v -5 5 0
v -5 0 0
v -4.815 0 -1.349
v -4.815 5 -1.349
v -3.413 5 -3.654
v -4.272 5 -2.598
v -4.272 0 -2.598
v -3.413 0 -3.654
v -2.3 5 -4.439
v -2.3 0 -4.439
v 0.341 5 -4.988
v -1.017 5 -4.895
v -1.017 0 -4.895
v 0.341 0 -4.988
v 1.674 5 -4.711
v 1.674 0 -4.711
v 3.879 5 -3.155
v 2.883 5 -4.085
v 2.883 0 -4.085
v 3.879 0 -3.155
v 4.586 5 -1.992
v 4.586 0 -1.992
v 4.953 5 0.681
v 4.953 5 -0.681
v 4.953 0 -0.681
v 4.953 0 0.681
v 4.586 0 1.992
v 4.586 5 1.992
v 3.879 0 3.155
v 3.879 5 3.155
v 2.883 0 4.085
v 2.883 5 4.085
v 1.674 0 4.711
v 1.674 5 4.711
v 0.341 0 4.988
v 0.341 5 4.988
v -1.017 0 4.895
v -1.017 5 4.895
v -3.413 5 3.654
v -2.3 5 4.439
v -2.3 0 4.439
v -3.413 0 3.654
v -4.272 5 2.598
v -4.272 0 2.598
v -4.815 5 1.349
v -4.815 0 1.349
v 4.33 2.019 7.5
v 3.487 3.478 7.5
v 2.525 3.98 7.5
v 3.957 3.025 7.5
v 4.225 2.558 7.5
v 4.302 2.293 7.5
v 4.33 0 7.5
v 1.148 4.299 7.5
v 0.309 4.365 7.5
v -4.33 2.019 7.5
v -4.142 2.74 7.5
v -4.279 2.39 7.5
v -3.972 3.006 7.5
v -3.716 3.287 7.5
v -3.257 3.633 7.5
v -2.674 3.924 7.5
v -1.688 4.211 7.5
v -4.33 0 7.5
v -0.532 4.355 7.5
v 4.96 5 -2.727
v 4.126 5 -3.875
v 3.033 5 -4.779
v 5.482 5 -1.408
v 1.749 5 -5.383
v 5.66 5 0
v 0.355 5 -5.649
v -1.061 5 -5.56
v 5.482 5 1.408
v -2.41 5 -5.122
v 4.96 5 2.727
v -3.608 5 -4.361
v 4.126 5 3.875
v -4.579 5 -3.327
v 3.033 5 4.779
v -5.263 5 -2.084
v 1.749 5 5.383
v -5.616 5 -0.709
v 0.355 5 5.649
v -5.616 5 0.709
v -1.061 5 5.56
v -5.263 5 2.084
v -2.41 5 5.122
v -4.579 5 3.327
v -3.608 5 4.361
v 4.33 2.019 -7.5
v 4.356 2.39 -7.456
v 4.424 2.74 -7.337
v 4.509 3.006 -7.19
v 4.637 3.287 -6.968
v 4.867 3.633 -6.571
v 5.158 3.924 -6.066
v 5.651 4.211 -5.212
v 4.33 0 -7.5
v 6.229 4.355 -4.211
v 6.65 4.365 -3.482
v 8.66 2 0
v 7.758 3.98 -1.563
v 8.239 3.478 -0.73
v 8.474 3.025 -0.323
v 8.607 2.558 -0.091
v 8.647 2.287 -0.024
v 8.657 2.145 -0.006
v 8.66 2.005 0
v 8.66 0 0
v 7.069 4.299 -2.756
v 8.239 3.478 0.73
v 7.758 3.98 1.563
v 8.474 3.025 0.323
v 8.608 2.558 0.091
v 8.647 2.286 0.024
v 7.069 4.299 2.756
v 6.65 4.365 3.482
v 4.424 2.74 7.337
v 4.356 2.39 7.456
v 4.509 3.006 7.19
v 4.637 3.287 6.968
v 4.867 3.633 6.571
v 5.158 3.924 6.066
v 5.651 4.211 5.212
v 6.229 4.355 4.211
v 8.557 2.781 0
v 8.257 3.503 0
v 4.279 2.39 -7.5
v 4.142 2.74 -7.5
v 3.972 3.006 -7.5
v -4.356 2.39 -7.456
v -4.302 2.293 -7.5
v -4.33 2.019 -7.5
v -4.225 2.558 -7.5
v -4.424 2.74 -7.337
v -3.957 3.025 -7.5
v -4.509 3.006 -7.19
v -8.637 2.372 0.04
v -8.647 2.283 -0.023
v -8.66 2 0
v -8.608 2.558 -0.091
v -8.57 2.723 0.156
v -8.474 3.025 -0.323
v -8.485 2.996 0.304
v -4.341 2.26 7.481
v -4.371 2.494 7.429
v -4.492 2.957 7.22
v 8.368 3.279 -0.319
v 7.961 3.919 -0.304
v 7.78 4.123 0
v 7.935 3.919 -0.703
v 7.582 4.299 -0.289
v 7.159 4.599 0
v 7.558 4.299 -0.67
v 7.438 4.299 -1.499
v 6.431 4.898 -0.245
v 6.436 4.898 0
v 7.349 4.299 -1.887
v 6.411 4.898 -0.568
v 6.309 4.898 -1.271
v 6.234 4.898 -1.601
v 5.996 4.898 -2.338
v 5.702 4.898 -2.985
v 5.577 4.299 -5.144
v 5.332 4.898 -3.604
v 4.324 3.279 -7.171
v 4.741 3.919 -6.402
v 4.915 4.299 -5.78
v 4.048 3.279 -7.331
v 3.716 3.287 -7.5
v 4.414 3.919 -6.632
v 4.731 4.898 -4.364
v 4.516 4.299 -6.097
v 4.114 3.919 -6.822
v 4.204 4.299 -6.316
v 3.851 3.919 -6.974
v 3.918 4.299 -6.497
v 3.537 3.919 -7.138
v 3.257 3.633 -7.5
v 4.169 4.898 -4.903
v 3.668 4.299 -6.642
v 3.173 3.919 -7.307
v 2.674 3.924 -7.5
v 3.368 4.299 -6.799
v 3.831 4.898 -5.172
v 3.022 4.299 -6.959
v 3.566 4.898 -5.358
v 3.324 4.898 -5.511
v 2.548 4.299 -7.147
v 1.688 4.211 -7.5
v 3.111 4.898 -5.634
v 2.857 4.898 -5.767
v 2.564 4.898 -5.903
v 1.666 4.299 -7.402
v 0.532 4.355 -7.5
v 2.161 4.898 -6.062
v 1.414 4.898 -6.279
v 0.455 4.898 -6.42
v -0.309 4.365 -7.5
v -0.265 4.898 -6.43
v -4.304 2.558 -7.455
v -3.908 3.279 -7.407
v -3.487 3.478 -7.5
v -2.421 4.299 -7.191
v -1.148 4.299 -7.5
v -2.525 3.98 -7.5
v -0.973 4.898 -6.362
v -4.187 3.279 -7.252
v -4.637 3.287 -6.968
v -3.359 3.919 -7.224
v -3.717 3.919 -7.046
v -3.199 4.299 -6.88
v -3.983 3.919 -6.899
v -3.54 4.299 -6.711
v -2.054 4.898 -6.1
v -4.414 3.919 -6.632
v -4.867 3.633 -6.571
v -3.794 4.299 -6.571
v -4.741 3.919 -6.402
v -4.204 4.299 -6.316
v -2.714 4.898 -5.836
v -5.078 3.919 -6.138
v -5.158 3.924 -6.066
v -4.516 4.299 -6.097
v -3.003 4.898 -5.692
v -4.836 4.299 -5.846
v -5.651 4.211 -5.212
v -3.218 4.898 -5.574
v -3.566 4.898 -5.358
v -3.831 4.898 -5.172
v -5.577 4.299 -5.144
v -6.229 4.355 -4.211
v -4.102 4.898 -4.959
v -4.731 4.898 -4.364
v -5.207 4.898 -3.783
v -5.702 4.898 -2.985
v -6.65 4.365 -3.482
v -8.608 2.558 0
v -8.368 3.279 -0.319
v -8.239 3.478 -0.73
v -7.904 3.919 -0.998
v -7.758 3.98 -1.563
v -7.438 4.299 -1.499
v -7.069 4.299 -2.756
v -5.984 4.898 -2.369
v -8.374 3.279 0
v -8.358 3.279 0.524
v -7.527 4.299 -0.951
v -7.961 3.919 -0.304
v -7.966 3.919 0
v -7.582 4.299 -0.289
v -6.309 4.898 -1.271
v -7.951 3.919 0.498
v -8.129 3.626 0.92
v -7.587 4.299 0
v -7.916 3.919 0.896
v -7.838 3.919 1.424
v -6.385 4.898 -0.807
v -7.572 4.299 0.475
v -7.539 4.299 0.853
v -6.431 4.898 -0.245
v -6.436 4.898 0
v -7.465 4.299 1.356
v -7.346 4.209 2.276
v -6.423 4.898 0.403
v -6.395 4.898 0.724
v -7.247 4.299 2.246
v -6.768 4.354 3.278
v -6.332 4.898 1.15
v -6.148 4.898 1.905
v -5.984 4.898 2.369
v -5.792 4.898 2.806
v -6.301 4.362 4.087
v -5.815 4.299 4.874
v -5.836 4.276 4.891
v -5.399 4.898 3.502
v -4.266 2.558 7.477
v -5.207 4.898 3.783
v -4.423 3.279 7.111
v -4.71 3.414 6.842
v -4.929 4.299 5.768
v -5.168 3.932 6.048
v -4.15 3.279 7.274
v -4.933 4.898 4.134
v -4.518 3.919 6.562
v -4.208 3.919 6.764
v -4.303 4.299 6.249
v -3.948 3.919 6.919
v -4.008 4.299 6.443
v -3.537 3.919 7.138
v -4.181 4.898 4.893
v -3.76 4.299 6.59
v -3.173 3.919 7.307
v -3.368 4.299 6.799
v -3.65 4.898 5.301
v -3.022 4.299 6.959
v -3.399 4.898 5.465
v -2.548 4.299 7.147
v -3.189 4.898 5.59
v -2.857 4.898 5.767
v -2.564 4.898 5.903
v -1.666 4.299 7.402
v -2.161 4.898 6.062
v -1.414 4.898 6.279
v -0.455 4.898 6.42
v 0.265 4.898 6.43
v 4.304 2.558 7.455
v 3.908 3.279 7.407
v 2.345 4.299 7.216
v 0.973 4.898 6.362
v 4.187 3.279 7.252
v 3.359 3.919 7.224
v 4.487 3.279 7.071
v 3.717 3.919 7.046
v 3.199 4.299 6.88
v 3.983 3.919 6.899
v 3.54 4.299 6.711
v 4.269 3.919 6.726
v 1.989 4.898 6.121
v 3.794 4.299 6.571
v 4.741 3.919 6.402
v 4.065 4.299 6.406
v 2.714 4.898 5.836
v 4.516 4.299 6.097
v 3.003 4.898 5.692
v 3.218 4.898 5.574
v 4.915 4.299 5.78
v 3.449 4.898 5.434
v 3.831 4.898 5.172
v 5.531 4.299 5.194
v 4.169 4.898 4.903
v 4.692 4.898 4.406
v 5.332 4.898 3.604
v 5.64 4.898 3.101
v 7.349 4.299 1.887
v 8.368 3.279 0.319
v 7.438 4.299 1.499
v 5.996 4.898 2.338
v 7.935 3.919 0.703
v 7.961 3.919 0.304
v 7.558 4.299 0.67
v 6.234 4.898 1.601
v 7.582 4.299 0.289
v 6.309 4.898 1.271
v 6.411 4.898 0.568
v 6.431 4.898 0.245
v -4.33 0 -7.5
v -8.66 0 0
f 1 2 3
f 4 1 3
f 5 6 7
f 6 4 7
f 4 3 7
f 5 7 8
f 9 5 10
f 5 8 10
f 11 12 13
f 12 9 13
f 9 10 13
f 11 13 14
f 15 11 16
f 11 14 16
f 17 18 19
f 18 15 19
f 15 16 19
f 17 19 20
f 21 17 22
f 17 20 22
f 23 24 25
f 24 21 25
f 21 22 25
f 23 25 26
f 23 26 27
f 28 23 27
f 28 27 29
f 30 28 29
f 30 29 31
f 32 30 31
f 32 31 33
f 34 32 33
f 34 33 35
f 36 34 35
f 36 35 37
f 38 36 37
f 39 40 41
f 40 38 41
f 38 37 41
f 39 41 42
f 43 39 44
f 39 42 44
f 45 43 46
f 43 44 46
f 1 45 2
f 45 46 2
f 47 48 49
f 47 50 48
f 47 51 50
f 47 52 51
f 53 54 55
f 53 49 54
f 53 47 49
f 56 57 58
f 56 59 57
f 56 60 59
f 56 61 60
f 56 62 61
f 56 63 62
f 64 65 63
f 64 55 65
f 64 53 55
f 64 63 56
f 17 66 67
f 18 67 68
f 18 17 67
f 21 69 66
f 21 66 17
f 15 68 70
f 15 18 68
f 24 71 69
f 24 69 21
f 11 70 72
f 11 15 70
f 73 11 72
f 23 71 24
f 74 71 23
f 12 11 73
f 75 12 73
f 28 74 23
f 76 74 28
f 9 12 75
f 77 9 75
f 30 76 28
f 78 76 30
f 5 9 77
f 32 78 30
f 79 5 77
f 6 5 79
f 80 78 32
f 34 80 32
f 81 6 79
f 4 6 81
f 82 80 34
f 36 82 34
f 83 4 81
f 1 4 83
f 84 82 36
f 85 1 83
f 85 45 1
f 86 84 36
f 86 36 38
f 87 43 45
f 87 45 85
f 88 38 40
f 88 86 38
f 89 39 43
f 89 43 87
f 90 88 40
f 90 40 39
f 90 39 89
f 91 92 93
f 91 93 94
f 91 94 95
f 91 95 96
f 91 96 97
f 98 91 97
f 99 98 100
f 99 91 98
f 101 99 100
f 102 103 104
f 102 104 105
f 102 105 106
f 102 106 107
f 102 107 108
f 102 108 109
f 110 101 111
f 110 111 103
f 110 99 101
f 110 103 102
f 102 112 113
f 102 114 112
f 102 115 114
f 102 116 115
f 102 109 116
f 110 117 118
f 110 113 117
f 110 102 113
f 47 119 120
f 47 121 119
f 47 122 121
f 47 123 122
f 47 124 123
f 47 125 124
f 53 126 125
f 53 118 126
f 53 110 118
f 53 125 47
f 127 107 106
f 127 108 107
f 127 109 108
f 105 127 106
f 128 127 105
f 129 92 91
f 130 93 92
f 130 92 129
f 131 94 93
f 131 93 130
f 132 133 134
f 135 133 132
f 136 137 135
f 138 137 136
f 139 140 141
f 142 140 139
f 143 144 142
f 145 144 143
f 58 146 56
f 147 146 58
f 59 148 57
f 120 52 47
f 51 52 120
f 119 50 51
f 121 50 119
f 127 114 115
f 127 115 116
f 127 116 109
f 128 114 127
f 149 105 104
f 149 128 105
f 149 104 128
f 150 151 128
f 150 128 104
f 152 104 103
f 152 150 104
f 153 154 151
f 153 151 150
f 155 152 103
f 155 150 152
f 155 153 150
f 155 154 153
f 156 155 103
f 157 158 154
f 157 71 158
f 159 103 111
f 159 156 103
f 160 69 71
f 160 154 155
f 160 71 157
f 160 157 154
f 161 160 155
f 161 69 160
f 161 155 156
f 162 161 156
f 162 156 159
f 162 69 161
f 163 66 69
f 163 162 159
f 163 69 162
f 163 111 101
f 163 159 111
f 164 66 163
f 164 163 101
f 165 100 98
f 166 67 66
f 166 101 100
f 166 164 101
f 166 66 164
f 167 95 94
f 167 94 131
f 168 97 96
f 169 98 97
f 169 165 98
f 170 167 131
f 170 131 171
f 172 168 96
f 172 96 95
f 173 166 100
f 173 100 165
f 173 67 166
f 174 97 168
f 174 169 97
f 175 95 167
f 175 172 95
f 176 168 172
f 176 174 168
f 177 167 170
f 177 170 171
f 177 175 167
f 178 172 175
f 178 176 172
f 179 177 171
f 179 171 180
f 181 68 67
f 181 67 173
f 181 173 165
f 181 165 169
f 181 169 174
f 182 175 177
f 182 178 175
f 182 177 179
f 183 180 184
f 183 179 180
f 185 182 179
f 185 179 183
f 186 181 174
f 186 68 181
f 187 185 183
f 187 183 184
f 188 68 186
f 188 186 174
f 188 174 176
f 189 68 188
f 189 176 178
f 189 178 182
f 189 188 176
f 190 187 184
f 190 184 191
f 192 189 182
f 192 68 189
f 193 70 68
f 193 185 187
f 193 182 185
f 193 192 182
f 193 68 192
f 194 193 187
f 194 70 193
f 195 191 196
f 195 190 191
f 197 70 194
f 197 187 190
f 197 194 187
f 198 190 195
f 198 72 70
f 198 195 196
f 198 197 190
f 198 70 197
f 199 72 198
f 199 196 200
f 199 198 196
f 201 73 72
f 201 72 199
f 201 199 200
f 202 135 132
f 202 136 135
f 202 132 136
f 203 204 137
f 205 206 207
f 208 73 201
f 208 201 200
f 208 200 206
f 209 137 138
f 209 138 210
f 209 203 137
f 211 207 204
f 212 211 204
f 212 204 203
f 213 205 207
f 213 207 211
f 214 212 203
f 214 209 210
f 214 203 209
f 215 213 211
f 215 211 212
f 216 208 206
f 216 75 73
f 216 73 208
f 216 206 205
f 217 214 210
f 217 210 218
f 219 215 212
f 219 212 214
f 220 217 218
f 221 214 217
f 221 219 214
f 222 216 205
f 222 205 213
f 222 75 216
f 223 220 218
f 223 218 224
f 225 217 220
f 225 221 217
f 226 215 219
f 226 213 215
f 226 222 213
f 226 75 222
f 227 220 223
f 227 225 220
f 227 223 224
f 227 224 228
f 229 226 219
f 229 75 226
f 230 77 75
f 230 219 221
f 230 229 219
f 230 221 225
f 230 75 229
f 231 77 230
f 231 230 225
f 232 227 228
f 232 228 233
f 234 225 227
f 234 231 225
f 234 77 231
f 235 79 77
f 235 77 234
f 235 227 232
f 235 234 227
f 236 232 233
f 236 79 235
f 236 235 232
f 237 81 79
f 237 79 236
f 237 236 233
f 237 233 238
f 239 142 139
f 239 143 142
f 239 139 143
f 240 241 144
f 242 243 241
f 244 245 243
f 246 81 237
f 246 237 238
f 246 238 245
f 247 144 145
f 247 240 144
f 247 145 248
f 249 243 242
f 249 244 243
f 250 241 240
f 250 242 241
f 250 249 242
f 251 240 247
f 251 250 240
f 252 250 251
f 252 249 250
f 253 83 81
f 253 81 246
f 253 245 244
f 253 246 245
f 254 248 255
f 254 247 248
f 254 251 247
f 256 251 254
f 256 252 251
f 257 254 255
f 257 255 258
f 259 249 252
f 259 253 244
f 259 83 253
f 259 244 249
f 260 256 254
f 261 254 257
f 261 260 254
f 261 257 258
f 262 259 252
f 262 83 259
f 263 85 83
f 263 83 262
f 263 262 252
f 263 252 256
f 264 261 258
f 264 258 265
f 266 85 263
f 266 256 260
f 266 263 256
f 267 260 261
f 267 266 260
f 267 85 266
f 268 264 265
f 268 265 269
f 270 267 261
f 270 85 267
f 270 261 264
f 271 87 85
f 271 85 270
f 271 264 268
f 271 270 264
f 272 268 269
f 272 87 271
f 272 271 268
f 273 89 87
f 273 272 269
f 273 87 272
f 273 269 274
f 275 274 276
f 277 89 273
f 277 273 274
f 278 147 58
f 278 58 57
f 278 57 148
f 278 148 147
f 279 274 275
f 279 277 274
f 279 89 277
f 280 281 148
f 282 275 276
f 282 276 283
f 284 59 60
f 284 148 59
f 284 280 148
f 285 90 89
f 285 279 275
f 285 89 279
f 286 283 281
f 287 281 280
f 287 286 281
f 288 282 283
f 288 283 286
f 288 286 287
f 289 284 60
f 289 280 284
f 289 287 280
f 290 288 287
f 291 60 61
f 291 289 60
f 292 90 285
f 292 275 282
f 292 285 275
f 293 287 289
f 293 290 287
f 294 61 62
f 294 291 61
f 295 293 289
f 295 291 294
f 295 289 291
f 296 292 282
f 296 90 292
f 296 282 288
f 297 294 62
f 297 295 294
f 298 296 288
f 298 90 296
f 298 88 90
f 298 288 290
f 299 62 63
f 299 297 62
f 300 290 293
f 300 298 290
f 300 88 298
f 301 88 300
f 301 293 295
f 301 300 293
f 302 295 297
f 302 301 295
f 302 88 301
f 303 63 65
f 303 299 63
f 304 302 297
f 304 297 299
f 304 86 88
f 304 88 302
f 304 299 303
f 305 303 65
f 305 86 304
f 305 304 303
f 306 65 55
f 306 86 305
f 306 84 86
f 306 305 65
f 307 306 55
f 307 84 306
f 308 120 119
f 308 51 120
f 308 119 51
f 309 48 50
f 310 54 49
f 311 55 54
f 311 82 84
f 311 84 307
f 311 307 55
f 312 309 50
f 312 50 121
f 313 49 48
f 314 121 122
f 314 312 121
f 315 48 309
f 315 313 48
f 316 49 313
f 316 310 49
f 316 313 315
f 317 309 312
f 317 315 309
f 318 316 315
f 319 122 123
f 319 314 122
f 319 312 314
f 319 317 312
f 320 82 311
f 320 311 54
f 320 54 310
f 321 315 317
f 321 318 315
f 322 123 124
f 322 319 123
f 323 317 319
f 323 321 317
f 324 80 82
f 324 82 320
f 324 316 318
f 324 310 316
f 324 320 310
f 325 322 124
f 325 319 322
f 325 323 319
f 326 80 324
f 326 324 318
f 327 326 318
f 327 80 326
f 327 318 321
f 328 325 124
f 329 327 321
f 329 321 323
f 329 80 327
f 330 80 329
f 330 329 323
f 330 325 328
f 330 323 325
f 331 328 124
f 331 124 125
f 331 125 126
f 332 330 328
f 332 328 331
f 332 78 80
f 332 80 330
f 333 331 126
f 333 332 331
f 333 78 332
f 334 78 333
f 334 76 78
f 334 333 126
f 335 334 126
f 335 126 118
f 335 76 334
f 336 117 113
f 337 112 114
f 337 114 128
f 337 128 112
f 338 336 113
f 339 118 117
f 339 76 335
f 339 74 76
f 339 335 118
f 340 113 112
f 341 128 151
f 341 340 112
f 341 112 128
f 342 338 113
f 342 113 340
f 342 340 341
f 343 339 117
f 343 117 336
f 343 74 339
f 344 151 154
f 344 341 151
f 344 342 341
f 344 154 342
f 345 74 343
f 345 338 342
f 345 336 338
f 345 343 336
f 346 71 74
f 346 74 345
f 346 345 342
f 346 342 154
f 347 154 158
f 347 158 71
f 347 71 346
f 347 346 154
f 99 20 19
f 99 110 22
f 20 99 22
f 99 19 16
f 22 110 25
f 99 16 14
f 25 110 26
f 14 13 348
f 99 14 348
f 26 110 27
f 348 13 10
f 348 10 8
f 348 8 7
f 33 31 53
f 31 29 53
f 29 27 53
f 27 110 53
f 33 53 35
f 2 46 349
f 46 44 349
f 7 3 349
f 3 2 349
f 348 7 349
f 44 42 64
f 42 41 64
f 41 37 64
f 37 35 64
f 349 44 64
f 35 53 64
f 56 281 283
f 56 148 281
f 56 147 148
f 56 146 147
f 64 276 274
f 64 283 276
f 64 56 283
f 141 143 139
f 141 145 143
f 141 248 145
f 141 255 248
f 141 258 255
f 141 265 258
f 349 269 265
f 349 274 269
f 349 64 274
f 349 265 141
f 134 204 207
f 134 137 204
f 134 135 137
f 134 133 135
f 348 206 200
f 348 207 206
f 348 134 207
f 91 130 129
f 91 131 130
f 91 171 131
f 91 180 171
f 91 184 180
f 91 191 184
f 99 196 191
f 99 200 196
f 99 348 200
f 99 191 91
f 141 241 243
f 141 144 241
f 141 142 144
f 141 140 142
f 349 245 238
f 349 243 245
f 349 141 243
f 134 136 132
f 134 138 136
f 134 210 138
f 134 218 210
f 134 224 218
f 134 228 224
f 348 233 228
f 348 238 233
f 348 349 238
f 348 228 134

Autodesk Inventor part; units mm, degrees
ref_plane "YZ Plane" through (0, 0, 0) normal (1, 0, 0) x (0, 1, 0)
ref_plane "XZ Plane" through (0, 0, 0) normal (0, 1, 0) x (-1, 0, 0)
ref_plane "XY Plane" through (0, 0, 0) normal (0, 0, 1) x (1, 0, 0)
sketch "Sketch1" plane through (0, 0, 0) normal (0, 1, 0) x (-1, 0, 0)
  line L0 (-8.6603, 0) -> (-4.3301, 7.5)
  line L1 (-4.3301, 7.5) -> (4.3301, 7.5)
  line L2 (4.3301, 7.5) -> (8.6603, 0)
  line L3 (8.6603, 0) -> (4.3301, -7.5)
  line L4 (4.3301, -7.5) -> (-4.3301, -7.5)
  line L5 (-4.3301, -7.5) -> (-8.6603, 0)
  circle A0 centre (0, 0) radius 5
  dimension "d0" = 15
  dimension "d1" = 10
extrude "Extrusion1" add sketch "Sketch1" along normal blind 5
sketch "Sketch5" plane through (0, 0, 0) normal (0, 0, 1) x (1, 0, 0)
  line L0 (8.6603, 5) -> (4.3301, 5) projected
  line L1 (5.6603, 5) -> (8.6603, 5)
  line L2 (8.6603, 2) -> (8.6603, 2.1818)
  arc A0 (8.6603, 2) -> (5.6603, 5) centre (5.6603, 2) ccw
  line L3 (8.6603, 2) -> (8.6603, 5)
  line L4 (0, 0) -> (0, 10.7408) construction
  dimension "d6" = 3
revolve "Revolution1" cut sketch "Sketch5" angle 360 about axis through (0, 0, 0) along (0, 1, 0)
thread "Thread1" size "M10x1.5" class "6H" standard "ANSI Metric M Profile" full length
properties part number "NUT"
